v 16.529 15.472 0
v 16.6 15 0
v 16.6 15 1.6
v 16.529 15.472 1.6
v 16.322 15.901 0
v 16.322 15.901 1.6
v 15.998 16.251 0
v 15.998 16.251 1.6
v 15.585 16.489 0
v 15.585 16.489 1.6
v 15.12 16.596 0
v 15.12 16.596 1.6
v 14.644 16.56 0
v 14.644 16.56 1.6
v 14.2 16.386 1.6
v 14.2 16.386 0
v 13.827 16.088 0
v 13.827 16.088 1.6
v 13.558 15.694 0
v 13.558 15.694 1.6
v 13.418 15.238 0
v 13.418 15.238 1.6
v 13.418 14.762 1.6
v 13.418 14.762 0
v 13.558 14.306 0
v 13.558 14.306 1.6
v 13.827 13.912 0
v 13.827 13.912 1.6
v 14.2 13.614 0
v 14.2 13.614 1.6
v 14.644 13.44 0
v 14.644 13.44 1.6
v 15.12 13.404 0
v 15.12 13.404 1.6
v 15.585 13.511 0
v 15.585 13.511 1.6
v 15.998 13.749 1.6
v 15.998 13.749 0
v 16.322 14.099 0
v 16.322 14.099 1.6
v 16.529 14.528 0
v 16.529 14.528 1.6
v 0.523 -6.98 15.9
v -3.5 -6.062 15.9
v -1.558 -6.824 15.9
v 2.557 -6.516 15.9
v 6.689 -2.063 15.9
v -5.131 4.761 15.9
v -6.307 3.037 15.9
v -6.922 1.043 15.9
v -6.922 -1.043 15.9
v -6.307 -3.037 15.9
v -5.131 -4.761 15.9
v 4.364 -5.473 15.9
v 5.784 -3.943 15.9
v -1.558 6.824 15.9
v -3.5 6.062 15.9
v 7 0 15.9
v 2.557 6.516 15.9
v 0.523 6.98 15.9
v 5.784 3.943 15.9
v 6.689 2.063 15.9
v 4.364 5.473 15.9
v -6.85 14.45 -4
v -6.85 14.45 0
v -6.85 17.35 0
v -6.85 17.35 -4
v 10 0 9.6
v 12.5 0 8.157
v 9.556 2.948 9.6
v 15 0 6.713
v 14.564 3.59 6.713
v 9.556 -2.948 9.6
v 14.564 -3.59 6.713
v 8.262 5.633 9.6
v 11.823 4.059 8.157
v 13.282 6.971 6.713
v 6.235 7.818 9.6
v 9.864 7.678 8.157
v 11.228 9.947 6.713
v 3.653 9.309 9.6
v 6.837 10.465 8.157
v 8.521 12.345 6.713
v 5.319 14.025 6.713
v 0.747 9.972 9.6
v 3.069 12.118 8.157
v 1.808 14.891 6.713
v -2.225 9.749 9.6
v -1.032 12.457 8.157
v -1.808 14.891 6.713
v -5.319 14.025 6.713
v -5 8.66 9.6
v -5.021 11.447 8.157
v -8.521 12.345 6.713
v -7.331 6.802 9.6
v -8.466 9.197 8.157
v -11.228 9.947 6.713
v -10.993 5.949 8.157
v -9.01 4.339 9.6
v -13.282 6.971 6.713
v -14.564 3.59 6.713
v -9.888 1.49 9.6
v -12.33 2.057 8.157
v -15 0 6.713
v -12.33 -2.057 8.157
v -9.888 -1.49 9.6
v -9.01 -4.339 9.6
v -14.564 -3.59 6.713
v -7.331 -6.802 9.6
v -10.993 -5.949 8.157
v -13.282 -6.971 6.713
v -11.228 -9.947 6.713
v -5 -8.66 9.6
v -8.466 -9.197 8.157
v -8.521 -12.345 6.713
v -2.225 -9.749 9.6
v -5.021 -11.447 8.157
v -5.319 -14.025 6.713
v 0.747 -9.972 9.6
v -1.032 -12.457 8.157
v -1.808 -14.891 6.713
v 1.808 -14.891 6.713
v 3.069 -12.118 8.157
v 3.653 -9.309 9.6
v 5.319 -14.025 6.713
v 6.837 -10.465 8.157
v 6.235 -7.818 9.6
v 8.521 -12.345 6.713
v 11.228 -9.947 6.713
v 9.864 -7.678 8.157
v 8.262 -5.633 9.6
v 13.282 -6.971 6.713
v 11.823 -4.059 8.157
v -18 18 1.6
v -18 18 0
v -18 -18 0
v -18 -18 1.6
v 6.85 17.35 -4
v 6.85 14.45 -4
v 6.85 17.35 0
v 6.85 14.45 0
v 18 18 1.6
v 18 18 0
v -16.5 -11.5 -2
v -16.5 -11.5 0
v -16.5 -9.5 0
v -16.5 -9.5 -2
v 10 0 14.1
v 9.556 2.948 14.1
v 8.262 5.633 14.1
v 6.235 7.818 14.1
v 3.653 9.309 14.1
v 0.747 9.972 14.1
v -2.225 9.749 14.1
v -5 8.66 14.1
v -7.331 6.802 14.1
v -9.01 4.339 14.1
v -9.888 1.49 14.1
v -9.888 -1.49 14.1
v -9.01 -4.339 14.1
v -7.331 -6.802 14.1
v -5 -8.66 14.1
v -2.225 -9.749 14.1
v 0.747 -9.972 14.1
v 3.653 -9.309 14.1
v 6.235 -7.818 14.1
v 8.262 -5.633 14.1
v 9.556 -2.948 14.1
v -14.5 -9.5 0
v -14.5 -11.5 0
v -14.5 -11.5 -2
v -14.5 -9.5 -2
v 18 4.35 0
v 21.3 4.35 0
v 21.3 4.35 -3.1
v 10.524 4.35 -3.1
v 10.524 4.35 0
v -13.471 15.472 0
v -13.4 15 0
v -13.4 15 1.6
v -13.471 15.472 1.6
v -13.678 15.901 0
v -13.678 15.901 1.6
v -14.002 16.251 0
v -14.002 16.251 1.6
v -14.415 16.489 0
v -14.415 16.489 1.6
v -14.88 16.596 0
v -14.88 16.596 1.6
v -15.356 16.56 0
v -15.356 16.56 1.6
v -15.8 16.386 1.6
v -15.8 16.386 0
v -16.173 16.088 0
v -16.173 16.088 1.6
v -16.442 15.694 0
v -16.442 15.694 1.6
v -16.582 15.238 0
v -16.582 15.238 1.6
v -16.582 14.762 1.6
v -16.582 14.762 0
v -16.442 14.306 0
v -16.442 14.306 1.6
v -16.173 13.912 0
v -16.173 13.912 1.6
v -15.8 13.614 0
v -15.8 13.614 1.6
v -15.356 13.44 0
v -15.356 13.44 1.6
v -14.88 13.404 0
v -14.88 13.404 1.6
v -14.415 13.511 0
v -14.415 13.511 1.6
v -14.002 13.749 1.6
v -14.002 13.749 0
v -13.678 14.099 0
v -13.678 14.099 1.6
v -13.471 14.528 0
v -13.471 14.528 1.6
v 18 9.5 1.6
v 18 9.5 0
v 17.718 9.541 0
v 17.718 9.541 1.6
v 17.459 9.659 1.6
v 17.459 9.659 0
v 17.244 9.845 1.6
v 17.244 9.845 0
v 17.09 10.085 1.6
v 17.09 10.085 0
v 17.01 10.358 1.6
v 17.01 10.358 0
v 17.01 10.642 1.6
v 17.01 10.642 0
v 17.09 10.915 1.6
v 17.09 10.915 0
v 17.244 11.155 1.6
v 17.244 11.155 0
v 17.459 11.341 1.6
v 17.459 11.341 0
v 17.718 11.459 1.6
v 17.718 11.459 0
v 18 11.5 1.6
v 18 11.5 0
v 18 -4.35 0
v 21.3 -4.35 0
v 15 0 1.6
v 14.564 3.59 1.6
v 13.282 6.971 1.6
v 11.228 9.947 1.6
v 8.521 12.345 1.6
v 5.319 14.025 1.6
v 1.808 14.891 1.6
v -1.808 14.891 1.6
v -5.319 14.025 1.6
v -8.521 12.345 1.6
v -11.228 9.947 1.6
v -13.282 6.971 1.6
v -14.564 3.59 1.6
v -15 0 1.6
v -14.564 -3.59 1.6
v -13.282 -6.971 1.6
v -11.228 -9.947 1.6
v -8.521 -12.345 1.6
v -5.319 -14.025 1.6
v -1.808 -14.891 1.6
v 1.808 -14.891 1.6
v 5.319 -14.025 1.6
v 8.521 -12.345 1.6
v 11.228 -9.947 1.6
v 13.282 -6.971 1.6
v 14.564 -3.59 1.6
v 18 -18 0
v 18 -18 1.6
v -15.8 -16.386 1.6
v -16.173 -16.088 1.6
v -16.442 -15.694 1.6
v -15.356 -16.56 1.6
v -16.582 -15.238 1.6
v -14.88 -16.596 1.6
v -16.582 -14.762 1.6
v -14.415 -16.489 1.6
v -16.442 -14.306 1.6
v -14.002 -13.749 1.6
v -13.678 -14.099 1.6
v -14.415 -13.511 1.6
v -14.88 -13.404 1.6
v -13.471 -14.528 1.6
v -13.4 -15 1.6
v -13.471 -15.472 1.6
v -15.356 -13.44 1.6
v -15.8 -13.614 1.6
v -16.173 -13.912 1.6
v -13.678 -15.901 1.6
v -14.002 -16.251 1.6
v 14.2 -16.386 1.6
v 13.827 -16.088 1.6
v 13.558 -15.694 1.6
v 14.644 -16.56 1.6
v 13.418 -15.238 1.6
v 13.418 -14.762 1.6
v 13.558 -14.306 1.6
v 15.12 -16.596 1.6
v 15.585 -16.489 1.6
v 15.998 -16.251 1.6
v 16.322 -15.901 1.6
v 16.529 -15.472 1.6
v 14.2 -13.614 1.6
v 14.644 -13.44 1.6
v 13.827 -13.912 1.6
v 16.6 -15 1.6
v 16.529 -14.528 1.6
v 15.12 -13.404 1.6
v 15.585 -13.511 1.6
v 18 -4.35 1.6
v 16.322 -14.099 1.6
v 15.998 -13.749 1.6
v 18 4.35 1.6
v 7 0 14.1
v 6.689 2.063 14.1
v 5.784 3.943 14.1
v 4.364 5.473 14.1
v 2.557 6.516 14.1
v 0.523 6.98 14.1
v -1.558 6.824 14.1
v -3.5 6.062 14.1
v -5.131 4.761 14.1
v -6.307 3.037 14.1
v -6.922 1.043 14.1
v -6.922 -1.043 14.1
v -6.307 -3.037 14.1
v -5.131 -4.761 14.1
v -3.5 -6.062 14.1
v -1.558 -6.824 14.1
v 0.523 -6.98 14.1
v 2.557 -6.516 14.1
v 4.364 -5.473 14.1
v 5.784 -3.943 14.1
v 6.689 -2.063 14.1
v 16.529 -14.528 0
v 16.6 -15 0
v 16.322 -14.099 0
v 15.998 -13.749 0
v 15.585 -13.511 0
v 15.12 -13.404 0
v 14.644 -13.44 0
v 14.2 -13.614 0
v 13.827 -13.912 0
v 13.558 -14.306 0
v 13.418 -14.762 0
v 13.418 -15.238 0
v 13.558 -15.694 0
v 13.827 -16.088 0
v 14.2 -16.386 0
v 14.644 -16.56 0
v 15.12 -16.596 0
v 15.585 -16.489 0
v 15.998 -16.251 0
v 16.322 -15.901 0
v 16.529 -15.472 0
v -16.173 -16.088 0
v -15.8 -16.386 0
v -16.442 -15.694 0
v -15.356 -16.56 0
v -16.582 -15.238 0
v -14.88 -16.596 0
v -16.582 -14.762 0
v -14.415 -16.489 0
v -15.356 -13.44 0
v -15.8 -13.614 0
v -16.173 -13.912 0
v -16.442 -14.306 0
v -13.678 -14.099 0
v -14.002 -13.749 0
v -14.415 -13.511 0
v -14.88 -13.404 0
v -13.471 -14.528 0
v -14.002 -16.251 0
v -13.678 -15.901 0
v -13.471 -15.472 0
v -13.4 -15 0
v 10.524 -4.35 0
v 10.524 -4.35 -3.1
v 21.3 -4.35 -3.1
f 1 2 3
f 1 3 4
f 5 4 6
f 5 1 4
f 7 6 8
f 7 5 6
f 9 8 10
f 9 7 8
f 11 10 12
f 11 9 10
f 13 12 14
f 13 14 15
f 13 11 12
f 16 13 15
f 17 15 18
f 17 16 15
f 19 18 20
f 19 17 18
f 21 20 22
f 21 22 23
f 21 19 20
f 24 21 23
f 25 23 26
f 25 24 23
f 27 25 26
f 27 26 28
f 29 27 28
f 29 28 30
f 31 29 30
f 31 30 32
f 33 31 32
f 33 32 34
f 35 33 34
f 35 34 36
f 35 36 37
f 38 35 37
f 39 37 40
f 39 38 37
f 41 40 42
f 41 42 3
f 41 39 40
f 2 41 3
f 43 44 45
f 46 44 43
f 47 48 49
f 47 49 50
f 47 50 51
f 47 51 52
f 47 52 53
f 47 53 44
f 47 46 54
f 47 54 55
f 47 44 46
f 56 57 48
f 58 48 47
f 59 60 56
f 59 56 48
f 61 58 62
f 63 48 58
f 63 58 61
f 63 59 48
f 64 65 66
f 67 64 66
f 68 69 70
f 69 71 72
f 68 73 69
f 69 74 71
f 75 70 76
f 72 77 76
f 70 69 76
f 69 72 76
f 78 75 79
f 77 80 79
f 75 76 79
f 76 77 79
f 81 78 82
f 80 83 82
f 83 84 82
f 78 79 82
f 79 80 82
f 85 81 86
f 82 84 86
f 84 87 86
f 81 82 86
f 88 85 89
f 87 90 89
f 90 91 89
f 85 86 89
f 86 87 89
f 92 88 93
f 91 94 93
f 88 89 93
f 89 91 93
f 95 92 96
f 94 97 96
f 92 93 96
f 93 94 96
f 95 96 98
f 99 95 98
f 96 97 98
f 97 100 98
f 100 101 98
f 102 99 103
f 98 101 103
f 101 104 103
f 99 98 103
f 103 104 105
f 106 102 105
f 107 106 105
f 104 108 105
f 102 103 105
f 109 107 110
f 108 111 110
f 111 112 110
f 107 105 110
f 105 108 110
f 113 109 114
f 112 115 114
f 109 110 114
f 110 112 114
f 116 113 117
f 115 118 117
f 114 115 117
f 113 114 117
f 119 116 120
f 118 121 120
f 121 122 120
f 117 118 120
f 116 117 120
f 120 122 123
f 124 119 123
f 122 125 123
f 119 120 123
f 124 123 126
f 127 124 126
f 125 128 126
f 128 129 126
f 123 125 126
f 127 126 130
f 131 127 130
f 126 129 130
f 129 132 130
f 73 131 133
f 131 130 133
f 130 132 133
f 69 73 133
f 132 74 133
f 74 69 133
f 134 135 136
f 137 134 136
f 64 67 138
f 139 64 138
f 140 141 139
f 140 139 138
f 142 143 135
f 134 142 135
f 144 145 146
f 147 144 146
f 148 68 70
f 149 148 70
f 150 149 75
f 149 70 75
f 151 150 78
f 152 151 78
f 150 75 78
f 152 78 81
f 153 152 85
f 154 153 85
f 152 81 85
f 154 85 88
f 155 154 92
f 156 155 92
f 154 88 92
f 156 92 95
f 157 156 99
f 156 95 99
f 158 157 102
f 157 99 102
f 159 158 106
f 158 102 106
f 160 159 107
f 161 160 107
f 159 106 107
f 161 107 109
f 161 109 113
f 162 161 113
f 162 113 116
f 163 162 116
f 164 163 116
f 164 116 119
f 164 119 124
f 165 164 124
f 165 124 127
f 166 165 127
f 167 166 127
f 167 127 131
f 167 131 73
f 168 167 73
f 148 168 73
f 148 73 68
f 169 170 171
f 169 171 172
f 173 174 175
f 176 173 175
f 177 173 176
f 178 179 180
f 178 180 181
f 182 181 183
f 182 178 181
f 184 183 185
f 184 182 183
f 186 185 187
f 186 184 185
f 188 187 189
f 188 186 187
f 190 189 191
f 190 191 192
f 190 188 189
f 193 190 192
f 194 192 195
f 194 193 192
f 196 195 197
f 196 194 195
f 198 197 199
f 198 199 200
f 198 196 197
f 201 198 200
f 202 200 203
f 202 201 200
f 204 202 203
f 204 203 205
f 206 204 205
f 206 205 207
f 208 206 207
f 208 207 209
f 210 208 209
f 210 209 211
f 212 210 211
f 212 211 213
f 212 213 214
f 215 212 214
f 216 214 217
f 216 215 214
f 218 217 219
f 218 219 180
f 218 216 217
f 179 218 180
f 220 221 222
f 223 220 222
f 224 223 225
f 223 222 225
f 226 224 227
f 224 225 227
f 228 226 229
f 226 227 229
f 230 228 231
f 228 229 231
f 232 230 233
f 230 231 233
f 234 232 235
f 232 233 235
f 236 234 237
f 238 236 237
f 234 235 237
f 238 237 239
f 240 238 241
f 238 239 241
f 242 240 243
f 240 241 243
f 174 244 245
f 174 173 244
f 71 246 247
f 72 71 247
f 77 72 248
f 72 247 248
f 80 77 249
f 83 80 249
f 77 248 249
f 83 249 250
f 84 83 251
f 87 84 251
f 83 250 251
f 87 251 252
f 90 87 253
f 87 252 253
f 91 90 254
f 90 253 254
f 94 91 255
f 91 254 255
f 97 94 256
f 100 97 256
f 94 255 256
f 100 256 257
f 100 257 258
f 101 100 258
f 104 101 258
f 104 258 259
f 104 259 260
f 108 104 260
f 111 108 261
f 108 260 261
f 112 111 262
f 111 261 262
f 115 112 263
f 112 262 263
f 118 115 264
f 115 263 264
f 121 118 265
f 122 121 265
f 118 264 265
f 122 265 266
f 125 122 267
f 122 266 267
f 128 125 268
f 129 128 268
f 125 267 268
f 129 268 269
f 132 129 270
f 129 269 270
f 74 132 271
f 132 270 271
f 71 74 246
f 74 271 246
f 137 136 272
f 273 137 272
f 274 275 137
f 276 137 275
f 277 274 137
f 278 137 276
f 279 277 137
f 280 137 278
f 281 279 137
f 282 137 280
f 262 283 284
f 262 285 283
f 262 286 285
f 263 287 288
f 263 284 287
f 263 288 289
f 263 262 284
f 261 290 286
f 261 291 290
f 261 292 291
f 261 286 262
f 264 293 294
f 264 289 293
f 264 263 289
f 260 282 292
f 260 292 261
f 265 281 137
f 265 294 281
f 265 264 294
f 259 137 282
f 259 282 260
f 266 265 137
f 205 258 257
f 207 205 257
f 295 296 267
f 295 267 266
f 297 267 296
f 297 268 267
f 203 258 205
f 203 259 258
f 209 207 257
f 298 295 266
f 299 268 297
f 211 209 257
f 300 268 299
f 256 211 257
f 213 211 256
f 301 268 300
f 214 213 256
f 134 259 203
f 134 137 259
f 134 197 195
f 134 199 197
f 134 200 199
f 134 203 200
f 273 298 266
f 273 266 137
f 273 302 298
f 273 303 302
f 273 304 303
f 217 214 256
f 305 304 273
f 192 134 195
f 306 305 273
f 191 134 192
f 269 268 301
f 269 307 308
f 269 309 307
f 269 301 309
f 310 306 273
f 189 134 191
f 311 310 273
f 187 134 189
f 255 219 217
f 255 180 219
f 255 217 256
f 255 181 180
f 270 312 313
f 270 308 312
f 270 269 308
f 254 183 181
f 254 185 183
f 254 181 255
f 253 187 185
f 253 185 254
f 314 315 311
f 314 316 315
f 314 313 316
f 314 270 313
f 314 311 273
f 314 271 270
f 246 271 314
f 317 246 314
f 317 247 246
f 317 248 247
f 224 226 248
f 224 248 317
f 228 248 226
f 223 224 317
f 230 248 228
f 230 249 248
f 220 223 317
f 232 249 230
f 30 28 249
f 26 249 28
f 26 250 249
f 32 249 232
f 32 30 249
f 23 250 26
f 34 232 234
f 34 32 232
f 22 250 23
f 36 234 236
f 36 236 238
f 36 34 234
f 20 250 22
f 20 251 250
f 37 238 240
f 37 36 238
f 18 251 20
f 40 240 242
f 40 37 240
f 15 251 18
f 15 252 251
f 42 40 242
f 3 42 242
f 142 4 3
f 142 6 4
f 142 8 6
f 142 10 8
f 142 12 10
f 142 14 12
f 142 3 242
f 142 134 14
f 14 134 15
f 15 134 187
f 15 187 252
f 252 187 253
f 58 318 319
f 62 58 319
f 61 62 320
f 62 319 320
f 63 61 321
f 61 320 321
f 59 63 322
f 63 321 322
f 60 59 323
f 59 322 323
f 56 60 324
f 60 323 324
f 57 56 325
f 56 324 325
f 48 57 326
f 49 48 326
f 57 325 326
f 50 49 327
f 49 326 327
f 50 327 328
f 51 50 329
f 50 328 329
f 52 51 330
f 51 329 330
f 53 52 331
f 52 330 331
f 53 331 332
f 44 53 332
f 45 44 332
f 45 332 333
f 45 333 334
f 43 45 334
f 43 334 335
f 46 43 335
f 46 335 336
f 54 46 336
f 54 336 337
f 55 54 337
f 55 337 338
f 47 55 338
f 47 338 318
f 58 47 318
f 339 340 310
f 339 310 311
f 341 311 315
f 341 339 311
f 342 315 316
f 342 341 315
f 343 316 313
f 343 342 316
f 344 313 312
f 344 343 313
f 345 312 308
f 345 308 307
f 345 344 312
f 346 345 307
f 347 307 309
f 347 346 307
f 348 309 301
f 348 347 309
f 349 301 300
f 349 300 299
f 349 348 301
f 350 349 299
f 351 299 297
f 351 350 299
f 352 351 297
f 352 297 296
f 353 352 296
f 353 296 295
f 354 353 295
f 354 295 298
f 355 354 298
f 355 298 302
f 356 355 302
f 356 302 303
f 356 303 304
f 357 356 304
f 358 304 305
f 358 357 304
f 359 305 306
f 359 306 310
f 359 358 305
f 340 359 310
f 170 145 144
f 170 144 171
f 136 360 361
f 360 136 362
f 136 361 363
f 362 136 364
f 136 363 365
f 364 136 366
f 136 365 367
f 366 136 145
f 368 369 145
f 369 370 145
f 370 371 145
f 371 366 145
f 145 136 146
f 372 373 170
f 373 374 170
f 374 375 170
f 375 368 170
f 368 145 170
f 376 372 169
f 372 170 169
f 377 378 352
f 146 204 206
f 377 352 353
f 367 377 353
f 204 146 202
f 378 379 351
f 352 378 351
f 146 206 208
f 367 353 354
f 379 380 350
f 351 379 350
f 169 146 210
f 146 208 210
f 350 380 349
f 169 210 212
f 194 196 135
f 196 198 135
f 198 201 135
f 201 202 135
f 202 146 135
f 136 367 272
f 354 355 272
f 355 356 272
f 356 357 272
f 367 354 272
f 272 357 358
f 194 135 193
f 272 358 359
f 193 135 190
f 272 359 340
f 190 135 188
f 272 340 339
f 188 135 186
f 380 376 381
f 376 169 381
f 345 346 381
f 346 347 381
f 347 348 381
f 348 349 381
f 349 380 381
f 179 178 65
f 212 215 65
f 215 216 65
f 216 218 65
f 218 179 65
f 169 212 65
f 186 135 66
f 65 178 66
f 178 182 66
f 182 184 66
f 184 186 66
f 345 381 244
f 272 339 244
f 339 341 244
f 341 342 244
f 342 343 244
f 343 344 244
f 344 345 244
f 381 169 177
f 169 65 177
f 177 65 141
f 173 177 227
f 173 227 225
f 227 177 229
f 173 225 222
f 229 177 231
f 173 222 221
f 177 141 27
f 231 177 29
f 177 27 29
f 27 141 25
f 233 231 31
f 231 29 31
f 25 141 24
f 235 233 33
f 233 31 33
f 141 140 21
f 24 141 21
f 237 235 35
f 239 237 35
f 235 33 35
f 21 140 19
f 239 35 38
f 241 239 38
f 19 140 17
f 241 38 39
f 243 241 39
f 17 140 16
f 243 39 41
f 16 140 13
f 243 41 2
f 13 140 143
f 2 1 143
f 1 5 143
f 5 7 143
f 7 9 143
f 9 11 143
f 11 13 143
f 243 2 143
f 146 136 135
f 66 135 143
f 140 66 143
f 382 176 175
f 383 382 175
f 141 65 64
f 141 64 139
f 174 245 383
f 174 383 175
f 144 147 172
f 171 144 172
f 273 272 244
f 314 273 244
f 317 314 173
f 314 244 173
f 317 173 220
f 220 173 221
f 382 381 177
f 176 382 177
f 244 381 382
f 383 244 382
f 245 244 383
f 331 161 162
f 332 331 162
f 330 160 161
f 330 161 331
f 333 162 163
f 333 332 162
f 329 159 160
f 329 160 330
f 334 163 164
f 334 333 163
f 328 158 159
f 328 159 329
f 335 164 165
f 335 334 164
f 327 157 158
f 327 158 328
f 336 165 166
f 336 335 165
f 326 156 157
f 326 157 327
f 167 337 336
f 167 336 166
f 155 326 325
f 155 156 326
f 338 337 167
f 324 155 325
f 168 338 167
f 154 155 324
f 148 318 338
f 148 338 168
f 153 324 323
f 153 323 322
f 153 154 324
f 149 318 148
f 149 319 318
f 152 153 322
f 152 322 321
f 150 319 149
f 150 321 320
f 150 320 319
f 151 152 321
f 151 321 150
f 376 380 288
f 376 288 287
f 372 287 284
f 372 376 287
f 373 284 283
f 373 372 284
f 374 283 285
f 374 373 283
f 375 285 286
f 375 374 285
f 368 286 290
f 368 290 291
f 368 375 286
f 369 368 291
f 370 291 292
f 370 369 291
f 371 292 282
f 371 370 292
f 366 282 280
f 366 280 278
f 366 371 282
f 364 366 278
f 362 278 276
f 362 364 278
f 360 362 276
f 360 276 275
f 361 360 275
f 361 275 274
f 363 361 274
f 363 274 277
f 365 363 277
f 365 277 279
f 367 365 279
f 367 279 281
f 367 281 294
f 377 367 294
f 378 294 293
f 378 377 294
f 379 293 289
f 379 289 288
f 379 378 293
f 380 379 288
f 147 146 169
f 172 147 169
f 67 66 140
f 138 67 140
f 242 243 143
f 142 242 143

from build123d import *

# Parameters (mm, degrees)
F0_R     = 1.6
F0_W     = 2
F0_H     = 2
F0_W_2   = 13.7
F0_H_2   = 2.9
F0_W_3   = 7.4758231461
F0_H_3   = 8.7
F1_DEPTH = 1.6
F2_DEPTH = 4
F0_W_4   = 3.3
F3_DEPTH = 3.1
F4_DEPTH = 2
F5_R     = 15
F5_R_2   = 10
F6_DEPTH = 8
F7_DEPTH = 12.5
F8_SIZE2 = 2.886741
F8_SIZE  = 4.99999
F5_R_3   = 7
F9_DEPTH = 14.3


# Not quite as in the source:
# - a fillet or chamfer is up to 0.001 mm smaller than in the source, because OpenCascade refuses the exact size


with BuildPart() as f1:
    # F0 (on Top) → F1 (new body)
    with BuildSketch(Plane.XY):
        with BuildLine():
            Line((-18, -18), (18, -18))
            Line((18, -18), (18, -4.35))
            Line((18, -4.35), (10.5241768539, -4.35))
            Line((10.5241768539, -4.35), (10.5241768539, 4.35))
            Line((10.5241768539, 4.35), (18, 4.35))
            Line((18, 4.35), (18, 9.5))
            ThreePointArc((18, 9.5), (17, 10.5), (18, 11.5))
            Line((18, 11.5), (18, 18))
            Line((18, 18), (-18, 18))
            Line((-18, 18), (-18, -18))
        make_face()
        with Locations((-15, -15)):
            Circle(F0_R, mode=Mode.SUBTRACT)
        with Locations((-15.5, -10.5)):
            Rectangle(F0_W, F0_H, mode=Mode.SUBTRACT)
        with Locations((15, -15)):
            Circle(F0_R, mode=Mode.SUBTRACT)
        with Locations((-15, 15)):
            Circle(F0_R, mode=Mode.SUBTRACT)
        with Locations((0, 15.9)):
            Rectangle(F0_W_2, F0_H_2, mode=Mode.SUBTRACT)
        with Locations((15, 15)):
            Circle(F0_R, mode=Mode.SUBTRACT)
        with Locations((0, 15.9)):
            Rectangle(F0_W_2, F0_H_2)
        with Locations((-15.5, -10.5)):
            Rectangle(F0_W, F0_H)
        with Locations((14.2620884269, 0)):
            Rectangle(F0_W_3, F0_H_3)
    extrude(amount=F1_DEPTH)

    # F0 (on Top) → F2 (join)
    with BuildSketch(Plane.XY):
        with Locations((0, 15.9)):
            Rectangle(F0_W_2, F0_H_2)
    extrude(amount=-F2_DEPTH)

    # F0 (on Top) → F3 (join)
    with BuildSketch(Plane.XY):
        with Locations((19.65, 0)):
            Rectangle(F0_W_4, F0_H_3)
        with Locations((14.2620884269, 0)):
            Rectangle(F0_W_3, F0_H_3)
    extrude(amount=-F3_DEPTH)

    # F0 (on Top) → F4 (join)
    with BuildSketch(Plane.XY):
        with Locations((-15.5, -10.5)):
            Rectangle(F0_W, F0_H)
    extrude(amount=-F4_DEPTH)

    # F5 (on face) → F6 (join)
    with BuildSketch(Plane.XY.offset(1.6)):
        Circle(F5_R)
        Circle(F5_R_2, mode=Mode.SUBTRACT)
    extrude(amount=F6_DEPTH)

    # F7 (add): a face of the model
    f7_faces = [f1.faces().sort_by_distance(p)[0] for p in [
        (0, 0, 1.6),
    ]]
    extrude(f7_faces, amount=F7_DEPTH)

    # F8 (size 5 and 2.8867513459 in the source; OpenCascade refuses exactly that, so slightly less here)
    f8_edges = [f1.edges().sort_by_distance(p)[0] for p in [
        (-15, 0, 9.6),
    ]]
    f8_side = f1.faces().sort_by_distance((-14.575736, 0, 9.6))[0]
    chamfer(f8_edges, length=F8_SIZE, length2=F8_SIZE2, reference=f8_side)

    # F5 (on face) → F9 (join)
    with BuildSketch(Plane.XY.offset(1.6)):
        Circle(F5_R_3)
    extrude(amount=F9_DEPTH)


solid = f1.part
